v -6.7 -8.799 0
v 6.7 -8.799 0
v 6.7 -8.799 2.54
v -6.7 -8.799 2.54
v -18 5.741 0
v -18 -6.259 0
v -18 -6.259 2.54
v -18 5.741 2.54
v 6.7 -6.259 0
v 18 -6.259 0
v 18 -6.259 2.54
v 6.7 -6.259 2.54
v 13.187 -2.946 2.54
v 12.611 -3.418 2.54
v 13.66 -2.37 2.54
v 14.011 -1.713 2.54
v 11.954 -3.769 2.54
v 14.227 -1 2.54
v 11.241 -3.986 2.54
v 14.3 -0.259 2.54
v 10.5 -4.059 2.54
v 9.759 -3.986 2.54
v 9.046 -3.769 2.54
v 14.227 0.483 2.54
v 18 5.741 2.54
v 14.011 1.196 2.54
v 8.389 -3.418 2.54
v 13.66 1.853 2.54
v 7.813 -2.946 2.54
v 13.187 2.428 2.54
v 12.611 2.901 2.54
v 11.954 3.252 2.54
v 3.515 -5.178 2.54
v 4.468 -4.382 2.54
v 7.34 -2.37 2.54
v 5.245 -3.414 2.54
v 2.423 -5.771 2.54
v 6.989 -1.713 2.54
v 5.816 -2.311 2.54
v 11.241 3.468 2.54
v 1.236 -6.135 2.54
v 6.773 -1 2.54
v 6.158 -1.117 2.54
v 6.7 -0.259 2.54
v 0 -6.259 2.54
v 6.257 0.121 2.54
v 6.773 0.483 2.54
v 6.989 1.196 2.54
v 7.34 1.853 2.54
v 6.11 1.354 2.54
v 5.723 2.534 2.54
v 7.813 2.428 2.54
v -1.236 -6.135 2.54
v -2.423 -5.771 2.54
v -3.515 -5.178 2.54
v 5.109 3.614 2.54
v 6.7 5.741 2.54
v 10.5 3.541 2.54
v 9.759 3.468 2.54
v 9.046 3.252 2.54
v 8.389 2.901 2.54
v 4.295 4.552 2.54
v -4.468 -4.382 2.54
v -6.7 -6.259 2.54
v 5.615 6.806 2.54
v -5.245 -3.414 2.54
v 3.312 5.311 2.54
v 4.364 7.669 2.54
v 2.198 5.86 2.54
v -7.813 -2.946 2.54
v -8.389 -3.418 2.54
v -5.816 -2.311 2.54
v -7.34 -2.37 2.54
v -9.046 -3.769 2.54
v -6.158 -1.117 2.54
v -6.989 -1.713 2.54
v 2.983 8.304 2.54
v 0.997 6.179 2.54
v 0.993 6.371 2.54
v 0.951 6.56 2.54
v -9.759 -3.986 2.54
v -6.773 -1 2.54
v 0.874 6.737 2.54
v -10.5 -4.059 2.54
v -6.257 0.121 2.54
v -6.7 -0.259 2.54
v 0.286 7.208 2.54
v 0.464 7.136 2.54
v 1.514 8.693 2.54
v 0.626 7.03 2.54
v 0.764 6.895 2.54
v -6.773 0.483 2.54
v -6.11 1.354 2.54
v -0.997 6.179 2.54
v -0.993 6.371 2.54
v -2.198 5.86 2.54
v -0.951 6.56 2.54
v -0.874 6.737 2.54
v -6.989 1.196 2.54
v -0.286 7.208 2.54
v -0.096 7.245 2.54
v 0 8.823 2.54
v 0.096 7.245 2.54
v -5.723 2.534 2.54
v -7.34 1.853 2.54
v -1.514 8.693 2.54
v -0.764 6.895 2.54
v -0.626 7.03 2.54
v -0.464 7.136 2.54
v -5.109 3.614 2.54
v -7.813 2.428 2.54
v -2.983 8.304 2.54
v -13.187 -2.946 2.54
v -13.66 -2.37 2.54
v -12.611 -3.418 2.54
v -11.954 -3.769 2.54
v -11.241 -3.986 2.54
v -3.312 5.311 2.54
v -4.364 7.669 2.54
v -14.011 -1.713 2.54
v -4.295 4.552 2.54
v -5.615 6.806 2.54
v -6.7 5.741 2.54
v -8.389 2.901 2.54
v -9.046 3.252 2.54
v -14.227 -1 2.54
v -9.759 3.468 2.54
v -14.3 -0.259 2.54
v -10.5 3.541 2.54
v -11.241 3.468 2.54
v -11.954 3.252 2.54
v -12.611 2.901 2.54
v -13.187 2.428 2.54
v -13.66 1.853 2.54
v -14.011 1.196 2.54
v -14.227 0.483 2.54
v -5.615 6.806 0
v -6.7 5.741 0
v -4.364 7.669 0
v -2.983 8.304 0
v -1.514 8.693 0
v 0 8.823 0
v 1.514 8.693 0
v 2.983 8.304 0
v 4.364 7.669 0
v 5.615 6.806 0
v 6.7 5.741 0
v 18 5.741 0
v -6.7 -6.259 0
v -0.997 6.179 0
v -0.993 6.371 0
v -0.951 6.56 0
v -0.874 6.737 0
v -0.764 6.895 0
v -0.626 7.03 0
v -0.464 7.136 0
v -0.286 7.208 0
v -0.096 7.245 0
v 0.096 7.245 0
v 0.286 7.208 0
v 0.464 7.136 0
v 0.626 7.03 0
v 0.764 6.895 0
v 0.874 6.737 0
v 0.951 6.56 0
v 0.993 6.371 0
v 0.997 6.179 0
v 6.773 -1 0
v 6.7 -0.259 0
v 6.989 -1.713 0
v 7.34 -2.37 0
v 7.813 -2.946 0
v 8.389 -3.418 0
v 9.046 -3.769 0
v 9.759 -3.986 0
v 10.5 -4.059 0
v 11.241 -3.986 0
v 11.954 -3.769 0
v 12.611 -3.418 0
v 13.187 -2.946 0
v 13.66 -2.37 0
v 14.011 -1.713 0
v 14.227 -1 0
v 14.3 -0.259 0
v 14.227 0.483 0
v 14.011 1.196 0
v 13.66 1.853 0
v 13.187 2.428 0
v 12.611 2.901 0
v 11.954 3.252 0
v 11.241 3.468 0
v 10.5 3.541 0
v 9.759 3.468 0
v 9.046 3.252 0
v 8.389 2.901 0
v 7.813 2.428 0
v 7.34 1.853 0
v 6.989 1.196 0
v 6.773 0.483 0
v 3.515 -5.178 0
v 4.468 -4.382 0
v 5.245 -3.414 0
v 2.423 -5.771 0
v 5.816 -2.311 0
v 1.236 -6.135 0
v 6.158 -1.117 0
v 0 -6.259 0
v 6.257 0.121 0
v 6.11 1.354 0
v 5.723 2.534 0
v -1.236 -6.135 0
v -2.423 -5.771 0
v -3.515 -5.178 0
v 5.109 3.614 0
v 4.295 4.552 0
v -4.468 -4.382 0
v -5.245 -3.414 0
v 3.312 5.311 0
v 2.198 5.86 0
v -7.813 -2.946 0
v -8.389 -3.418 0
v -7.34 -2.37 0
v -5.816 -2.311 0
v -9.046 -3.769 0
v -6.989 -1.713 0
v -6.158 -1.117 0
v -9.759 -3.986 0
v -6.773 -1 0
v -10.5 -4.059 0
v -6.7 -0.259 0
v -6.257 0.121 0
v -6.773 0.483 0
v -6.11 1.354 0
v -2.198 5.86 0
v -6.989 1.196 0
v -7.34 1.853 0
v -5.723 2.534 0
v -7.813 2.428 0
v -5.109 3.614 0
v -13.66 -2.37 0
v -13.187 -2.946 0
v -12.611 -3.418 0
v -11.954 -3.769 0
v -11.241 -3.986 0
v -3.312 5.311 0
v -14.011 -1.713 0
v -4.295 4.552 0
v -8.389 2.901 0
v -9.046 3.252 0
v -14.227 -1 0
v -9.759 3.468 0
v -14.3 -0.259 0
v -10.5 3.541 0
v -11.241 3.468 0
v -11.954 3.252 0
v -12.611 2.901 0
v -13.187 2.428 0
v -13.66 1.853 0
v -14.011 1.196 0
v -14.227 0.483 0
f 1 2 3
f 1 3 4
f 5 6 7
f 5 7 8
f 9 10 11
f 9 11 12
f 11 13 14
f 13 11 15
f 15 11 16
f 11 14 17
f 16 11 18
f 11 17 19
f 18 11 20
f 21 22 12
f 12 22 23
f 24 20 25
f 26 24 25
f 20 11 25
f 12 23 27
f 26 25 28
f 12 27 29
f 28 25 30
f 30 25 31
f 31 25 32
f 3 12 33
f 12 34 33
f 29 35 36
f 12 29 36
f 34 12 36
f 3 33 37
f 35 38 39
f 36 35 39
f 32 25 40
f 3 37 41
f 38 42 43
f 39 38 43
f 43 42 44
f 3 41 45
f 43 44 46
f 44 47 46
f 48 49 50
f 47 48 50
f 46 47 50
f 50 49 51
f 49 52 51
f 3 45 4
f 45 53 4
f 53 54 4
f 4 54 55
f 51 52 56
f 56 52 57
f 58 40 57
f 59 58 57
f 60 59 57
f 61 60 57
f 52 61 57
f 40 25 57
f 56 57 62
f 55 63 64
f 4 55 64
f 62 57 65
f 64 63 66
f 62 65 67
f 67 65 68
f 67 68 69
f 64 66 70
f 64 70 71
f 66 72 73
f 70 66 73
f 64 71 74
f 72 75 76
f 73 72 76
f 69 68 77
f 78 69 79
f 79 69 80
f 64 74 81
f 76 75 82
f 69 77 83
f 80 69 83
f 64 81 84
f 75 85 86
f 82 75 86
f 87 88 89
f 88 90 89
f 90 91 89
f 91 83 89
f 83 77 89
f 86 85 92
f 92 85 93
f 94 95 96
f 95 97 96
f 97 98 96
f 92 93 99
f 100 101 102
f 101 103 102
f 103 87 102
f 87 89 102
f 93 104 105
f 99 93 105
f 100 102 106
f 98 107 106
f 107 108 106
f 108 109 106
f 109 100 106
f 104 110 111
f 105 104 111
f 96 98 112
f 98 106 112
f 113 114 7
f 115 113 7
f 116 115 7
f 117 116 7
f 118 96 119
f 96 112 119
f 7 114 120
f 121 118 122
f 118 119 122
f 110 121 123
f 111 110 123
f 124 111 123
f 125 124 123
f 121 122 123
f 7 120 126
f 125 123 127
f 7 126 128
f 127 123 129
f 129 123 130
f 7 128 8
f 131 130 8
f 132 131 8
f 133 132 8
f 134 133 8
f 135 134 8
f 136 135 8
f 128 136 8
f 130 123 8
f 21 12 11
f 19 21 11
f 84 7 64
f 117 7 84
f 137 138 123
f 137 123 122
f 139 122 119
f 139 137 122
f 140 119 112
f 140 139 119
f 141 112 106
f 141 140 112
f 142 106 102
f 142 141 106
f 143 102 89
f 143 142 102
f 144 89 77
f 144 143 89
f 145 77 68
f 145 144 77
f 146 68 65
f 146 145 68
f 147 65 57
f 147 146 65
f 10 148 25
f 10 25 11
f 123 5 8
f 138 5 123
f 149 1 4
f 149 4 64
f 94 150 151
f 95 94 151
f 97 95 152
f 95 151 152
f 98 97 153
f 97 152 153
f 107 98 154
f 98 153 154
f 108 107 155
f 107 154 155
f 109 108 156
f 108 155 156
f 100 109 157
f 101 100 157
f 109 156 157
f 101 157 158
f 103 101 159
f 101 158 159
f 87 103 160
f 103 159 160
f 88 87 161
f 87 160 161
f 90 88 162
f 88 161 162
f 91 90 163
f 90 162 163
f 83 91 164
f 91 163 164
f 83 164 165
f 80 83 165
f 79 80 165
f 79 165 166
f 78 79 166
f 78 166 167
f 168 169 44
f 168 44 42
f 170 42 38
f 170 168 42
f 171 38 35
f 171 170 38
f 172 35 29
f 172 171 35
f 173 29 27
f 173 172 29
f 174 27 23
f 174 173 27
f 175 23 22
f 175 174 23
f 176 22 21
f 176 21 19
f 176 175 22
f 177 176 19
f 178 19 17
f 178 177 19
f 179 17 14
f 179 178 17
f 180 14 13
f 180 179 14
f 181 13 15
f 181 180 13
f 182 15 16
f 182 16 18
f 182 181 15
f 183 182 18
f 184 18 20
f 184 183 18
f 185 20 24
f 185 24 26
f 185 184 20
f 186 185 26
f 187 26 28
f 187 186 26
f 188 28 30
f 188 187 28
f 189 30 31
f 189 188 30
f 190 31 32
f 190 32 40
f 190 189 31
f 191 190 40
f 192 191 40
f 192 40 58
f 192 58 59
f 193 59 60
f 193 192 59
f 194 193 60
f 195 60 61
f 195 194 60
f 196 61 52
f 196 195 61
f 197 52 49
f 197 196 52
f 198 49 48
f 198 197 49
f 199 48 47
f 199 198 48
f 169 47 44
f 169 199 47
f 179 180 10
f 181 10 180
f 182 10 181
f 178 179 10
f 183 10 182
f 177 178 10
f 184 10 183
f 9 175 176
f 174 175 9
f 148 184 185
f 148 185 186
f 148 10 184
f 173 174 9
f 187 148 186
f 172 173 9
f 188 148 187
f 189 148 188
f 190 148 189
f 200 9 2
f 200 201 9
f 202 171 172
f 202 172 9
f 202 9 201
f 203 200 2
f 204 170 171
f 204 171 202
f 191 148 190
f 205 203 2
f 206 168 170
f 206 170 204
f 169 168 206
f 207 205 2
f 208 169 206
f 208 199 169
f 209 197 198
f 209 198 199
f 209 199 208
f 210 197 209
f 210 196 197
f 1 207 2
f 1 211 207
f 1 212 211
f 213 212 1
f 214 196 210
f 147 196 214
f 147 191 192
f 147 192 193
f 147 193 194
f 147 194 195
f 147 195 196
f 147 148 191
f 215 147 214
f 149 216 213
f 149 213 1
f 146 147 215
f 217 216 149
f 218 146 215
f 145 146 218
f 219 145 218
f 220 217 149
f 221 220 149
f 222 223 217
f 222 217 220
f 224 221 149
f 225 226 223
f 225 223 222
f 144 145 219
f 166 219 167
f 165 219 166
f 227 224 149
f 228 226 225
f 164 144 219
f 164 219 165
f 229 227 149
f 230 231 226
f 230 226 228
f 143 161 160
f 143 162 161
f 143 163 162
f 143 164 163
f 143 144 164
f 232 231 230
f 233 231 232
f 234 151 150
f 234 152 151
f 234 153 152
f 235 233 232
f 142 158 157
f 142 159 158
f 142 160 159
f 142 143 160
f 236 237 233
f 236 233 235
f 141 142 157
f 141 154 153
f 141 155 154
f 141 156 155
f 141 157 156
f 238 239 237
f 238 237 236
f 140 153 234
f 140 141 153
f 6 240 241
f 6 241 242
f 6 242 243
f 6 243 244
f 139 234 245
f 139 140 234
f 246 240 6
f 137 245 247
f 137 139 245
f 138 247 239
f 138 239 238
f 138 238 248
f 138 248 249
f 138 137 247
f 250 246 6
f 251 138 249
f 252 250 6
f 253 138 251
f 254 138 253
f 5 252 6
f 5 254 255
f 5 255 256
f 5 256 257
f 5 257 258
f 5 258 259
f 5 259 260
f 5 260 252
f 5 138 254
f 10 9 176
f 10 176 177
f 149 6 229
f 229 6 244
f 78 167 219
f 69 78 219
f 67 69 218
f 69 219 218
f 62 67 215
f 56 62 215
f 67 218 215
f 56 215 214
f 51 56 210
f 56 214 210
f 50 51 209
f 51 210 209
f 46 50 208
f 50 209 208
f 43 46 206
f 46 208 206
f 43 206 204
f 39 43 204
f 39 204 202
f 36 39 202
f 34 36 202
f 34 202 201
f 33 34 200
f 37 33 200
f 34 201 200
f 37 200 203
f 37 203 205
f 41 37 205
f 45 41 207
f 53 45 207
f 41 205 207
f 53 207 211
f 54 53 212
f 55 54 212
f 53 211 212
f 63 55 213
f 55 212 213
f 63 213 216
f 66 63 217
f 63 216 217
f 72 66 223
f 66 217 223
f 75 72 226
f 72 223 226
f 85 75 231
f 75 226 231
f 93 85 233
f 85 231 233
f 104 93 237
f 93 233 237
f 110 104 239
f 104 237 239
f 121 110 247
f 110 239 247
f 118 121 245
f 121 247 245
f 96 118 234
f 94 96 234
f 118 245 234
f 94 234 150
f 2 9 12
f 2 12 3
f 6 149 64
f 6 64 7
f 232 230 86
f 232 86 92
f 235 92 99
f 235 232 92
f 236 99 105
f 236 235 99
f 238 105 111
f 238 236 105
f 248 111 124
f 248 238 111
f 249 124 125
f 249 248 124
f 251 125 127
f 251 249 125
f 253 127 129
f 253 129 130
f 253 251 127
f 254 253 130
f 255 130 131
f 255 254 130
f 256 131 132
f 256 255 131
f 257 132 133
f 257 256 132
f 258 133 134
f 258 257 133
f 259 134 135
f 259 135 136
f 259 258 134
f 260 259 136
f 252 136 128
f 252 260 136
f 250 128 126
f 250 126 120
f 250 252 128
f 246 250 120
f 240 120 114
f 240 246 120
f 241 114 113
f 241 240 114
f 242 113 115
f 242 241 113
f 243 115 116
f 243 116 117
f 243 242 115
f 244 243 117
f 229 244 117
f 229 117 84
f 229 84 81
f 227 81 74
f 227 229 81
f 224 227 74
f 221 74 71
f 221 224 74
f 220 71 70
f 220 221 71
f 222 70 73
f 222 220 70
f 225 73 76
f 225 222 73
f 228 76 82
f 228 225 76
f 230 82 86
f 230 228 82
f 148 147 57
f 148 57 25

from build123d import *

# Parameters (mm, degrees)
SKETCH1_R  = 3.8
BASE_DEPTH = 2.54


with BuildPart() as part:
    # Sketch1 → Base (new body)
    with BuildSketch(Plane.XY):
        with BuildLine():
            Line((-18, -6.258565559), (-18, 5.741434441))
            Line((-18, 5.741434441), (-6.7, 5.741434441))
            ThreePointArc((-6.7, 5.741434441), (0, 8.823495307), (6.7, 5.741434441))
            Line((6.7, 5.741434441), (18, 5.741434441))
            Line((18, 5.741434441), (18, -6.258565559))
            Line((18, -6.258565559), (6.7, -6.258565559))
            Line((6.7, -6.258565559), (6.7, -8.798565559))
            Line((6.7, -8.798565559), (-6.7, -8.798565559))
            Line((-6.7, -8.798565559), (-6.7, -6.258565559))
            Line((-6.7, -6.258565559), (-18, -6.258565559))
        make_face()
        with Locations((-10.5, -0.258565559)):
            Circle(SKETCH1_R, mode=Mode.SUBTRACT)
        with Locations(Location((10.5, -0.258565559, 0), (0, 0, 180))):
            Circle(SKETCH1_R, mode=Mode.SUBTRACT)
        with BuildLine():
            ThreePointArc((0.997445717, 6.178571429), (0, -6.258565559), (-0.997445717, 6.178571429))
            ThreePointArc((-0.997445717, 6.178571429), (0, 7.25), (0.997445717, 6.178571429))
        make_face(mode=Mode.SUBTRACT)
    extrude(amount=BASE_DEPTH)


solid = part.part
